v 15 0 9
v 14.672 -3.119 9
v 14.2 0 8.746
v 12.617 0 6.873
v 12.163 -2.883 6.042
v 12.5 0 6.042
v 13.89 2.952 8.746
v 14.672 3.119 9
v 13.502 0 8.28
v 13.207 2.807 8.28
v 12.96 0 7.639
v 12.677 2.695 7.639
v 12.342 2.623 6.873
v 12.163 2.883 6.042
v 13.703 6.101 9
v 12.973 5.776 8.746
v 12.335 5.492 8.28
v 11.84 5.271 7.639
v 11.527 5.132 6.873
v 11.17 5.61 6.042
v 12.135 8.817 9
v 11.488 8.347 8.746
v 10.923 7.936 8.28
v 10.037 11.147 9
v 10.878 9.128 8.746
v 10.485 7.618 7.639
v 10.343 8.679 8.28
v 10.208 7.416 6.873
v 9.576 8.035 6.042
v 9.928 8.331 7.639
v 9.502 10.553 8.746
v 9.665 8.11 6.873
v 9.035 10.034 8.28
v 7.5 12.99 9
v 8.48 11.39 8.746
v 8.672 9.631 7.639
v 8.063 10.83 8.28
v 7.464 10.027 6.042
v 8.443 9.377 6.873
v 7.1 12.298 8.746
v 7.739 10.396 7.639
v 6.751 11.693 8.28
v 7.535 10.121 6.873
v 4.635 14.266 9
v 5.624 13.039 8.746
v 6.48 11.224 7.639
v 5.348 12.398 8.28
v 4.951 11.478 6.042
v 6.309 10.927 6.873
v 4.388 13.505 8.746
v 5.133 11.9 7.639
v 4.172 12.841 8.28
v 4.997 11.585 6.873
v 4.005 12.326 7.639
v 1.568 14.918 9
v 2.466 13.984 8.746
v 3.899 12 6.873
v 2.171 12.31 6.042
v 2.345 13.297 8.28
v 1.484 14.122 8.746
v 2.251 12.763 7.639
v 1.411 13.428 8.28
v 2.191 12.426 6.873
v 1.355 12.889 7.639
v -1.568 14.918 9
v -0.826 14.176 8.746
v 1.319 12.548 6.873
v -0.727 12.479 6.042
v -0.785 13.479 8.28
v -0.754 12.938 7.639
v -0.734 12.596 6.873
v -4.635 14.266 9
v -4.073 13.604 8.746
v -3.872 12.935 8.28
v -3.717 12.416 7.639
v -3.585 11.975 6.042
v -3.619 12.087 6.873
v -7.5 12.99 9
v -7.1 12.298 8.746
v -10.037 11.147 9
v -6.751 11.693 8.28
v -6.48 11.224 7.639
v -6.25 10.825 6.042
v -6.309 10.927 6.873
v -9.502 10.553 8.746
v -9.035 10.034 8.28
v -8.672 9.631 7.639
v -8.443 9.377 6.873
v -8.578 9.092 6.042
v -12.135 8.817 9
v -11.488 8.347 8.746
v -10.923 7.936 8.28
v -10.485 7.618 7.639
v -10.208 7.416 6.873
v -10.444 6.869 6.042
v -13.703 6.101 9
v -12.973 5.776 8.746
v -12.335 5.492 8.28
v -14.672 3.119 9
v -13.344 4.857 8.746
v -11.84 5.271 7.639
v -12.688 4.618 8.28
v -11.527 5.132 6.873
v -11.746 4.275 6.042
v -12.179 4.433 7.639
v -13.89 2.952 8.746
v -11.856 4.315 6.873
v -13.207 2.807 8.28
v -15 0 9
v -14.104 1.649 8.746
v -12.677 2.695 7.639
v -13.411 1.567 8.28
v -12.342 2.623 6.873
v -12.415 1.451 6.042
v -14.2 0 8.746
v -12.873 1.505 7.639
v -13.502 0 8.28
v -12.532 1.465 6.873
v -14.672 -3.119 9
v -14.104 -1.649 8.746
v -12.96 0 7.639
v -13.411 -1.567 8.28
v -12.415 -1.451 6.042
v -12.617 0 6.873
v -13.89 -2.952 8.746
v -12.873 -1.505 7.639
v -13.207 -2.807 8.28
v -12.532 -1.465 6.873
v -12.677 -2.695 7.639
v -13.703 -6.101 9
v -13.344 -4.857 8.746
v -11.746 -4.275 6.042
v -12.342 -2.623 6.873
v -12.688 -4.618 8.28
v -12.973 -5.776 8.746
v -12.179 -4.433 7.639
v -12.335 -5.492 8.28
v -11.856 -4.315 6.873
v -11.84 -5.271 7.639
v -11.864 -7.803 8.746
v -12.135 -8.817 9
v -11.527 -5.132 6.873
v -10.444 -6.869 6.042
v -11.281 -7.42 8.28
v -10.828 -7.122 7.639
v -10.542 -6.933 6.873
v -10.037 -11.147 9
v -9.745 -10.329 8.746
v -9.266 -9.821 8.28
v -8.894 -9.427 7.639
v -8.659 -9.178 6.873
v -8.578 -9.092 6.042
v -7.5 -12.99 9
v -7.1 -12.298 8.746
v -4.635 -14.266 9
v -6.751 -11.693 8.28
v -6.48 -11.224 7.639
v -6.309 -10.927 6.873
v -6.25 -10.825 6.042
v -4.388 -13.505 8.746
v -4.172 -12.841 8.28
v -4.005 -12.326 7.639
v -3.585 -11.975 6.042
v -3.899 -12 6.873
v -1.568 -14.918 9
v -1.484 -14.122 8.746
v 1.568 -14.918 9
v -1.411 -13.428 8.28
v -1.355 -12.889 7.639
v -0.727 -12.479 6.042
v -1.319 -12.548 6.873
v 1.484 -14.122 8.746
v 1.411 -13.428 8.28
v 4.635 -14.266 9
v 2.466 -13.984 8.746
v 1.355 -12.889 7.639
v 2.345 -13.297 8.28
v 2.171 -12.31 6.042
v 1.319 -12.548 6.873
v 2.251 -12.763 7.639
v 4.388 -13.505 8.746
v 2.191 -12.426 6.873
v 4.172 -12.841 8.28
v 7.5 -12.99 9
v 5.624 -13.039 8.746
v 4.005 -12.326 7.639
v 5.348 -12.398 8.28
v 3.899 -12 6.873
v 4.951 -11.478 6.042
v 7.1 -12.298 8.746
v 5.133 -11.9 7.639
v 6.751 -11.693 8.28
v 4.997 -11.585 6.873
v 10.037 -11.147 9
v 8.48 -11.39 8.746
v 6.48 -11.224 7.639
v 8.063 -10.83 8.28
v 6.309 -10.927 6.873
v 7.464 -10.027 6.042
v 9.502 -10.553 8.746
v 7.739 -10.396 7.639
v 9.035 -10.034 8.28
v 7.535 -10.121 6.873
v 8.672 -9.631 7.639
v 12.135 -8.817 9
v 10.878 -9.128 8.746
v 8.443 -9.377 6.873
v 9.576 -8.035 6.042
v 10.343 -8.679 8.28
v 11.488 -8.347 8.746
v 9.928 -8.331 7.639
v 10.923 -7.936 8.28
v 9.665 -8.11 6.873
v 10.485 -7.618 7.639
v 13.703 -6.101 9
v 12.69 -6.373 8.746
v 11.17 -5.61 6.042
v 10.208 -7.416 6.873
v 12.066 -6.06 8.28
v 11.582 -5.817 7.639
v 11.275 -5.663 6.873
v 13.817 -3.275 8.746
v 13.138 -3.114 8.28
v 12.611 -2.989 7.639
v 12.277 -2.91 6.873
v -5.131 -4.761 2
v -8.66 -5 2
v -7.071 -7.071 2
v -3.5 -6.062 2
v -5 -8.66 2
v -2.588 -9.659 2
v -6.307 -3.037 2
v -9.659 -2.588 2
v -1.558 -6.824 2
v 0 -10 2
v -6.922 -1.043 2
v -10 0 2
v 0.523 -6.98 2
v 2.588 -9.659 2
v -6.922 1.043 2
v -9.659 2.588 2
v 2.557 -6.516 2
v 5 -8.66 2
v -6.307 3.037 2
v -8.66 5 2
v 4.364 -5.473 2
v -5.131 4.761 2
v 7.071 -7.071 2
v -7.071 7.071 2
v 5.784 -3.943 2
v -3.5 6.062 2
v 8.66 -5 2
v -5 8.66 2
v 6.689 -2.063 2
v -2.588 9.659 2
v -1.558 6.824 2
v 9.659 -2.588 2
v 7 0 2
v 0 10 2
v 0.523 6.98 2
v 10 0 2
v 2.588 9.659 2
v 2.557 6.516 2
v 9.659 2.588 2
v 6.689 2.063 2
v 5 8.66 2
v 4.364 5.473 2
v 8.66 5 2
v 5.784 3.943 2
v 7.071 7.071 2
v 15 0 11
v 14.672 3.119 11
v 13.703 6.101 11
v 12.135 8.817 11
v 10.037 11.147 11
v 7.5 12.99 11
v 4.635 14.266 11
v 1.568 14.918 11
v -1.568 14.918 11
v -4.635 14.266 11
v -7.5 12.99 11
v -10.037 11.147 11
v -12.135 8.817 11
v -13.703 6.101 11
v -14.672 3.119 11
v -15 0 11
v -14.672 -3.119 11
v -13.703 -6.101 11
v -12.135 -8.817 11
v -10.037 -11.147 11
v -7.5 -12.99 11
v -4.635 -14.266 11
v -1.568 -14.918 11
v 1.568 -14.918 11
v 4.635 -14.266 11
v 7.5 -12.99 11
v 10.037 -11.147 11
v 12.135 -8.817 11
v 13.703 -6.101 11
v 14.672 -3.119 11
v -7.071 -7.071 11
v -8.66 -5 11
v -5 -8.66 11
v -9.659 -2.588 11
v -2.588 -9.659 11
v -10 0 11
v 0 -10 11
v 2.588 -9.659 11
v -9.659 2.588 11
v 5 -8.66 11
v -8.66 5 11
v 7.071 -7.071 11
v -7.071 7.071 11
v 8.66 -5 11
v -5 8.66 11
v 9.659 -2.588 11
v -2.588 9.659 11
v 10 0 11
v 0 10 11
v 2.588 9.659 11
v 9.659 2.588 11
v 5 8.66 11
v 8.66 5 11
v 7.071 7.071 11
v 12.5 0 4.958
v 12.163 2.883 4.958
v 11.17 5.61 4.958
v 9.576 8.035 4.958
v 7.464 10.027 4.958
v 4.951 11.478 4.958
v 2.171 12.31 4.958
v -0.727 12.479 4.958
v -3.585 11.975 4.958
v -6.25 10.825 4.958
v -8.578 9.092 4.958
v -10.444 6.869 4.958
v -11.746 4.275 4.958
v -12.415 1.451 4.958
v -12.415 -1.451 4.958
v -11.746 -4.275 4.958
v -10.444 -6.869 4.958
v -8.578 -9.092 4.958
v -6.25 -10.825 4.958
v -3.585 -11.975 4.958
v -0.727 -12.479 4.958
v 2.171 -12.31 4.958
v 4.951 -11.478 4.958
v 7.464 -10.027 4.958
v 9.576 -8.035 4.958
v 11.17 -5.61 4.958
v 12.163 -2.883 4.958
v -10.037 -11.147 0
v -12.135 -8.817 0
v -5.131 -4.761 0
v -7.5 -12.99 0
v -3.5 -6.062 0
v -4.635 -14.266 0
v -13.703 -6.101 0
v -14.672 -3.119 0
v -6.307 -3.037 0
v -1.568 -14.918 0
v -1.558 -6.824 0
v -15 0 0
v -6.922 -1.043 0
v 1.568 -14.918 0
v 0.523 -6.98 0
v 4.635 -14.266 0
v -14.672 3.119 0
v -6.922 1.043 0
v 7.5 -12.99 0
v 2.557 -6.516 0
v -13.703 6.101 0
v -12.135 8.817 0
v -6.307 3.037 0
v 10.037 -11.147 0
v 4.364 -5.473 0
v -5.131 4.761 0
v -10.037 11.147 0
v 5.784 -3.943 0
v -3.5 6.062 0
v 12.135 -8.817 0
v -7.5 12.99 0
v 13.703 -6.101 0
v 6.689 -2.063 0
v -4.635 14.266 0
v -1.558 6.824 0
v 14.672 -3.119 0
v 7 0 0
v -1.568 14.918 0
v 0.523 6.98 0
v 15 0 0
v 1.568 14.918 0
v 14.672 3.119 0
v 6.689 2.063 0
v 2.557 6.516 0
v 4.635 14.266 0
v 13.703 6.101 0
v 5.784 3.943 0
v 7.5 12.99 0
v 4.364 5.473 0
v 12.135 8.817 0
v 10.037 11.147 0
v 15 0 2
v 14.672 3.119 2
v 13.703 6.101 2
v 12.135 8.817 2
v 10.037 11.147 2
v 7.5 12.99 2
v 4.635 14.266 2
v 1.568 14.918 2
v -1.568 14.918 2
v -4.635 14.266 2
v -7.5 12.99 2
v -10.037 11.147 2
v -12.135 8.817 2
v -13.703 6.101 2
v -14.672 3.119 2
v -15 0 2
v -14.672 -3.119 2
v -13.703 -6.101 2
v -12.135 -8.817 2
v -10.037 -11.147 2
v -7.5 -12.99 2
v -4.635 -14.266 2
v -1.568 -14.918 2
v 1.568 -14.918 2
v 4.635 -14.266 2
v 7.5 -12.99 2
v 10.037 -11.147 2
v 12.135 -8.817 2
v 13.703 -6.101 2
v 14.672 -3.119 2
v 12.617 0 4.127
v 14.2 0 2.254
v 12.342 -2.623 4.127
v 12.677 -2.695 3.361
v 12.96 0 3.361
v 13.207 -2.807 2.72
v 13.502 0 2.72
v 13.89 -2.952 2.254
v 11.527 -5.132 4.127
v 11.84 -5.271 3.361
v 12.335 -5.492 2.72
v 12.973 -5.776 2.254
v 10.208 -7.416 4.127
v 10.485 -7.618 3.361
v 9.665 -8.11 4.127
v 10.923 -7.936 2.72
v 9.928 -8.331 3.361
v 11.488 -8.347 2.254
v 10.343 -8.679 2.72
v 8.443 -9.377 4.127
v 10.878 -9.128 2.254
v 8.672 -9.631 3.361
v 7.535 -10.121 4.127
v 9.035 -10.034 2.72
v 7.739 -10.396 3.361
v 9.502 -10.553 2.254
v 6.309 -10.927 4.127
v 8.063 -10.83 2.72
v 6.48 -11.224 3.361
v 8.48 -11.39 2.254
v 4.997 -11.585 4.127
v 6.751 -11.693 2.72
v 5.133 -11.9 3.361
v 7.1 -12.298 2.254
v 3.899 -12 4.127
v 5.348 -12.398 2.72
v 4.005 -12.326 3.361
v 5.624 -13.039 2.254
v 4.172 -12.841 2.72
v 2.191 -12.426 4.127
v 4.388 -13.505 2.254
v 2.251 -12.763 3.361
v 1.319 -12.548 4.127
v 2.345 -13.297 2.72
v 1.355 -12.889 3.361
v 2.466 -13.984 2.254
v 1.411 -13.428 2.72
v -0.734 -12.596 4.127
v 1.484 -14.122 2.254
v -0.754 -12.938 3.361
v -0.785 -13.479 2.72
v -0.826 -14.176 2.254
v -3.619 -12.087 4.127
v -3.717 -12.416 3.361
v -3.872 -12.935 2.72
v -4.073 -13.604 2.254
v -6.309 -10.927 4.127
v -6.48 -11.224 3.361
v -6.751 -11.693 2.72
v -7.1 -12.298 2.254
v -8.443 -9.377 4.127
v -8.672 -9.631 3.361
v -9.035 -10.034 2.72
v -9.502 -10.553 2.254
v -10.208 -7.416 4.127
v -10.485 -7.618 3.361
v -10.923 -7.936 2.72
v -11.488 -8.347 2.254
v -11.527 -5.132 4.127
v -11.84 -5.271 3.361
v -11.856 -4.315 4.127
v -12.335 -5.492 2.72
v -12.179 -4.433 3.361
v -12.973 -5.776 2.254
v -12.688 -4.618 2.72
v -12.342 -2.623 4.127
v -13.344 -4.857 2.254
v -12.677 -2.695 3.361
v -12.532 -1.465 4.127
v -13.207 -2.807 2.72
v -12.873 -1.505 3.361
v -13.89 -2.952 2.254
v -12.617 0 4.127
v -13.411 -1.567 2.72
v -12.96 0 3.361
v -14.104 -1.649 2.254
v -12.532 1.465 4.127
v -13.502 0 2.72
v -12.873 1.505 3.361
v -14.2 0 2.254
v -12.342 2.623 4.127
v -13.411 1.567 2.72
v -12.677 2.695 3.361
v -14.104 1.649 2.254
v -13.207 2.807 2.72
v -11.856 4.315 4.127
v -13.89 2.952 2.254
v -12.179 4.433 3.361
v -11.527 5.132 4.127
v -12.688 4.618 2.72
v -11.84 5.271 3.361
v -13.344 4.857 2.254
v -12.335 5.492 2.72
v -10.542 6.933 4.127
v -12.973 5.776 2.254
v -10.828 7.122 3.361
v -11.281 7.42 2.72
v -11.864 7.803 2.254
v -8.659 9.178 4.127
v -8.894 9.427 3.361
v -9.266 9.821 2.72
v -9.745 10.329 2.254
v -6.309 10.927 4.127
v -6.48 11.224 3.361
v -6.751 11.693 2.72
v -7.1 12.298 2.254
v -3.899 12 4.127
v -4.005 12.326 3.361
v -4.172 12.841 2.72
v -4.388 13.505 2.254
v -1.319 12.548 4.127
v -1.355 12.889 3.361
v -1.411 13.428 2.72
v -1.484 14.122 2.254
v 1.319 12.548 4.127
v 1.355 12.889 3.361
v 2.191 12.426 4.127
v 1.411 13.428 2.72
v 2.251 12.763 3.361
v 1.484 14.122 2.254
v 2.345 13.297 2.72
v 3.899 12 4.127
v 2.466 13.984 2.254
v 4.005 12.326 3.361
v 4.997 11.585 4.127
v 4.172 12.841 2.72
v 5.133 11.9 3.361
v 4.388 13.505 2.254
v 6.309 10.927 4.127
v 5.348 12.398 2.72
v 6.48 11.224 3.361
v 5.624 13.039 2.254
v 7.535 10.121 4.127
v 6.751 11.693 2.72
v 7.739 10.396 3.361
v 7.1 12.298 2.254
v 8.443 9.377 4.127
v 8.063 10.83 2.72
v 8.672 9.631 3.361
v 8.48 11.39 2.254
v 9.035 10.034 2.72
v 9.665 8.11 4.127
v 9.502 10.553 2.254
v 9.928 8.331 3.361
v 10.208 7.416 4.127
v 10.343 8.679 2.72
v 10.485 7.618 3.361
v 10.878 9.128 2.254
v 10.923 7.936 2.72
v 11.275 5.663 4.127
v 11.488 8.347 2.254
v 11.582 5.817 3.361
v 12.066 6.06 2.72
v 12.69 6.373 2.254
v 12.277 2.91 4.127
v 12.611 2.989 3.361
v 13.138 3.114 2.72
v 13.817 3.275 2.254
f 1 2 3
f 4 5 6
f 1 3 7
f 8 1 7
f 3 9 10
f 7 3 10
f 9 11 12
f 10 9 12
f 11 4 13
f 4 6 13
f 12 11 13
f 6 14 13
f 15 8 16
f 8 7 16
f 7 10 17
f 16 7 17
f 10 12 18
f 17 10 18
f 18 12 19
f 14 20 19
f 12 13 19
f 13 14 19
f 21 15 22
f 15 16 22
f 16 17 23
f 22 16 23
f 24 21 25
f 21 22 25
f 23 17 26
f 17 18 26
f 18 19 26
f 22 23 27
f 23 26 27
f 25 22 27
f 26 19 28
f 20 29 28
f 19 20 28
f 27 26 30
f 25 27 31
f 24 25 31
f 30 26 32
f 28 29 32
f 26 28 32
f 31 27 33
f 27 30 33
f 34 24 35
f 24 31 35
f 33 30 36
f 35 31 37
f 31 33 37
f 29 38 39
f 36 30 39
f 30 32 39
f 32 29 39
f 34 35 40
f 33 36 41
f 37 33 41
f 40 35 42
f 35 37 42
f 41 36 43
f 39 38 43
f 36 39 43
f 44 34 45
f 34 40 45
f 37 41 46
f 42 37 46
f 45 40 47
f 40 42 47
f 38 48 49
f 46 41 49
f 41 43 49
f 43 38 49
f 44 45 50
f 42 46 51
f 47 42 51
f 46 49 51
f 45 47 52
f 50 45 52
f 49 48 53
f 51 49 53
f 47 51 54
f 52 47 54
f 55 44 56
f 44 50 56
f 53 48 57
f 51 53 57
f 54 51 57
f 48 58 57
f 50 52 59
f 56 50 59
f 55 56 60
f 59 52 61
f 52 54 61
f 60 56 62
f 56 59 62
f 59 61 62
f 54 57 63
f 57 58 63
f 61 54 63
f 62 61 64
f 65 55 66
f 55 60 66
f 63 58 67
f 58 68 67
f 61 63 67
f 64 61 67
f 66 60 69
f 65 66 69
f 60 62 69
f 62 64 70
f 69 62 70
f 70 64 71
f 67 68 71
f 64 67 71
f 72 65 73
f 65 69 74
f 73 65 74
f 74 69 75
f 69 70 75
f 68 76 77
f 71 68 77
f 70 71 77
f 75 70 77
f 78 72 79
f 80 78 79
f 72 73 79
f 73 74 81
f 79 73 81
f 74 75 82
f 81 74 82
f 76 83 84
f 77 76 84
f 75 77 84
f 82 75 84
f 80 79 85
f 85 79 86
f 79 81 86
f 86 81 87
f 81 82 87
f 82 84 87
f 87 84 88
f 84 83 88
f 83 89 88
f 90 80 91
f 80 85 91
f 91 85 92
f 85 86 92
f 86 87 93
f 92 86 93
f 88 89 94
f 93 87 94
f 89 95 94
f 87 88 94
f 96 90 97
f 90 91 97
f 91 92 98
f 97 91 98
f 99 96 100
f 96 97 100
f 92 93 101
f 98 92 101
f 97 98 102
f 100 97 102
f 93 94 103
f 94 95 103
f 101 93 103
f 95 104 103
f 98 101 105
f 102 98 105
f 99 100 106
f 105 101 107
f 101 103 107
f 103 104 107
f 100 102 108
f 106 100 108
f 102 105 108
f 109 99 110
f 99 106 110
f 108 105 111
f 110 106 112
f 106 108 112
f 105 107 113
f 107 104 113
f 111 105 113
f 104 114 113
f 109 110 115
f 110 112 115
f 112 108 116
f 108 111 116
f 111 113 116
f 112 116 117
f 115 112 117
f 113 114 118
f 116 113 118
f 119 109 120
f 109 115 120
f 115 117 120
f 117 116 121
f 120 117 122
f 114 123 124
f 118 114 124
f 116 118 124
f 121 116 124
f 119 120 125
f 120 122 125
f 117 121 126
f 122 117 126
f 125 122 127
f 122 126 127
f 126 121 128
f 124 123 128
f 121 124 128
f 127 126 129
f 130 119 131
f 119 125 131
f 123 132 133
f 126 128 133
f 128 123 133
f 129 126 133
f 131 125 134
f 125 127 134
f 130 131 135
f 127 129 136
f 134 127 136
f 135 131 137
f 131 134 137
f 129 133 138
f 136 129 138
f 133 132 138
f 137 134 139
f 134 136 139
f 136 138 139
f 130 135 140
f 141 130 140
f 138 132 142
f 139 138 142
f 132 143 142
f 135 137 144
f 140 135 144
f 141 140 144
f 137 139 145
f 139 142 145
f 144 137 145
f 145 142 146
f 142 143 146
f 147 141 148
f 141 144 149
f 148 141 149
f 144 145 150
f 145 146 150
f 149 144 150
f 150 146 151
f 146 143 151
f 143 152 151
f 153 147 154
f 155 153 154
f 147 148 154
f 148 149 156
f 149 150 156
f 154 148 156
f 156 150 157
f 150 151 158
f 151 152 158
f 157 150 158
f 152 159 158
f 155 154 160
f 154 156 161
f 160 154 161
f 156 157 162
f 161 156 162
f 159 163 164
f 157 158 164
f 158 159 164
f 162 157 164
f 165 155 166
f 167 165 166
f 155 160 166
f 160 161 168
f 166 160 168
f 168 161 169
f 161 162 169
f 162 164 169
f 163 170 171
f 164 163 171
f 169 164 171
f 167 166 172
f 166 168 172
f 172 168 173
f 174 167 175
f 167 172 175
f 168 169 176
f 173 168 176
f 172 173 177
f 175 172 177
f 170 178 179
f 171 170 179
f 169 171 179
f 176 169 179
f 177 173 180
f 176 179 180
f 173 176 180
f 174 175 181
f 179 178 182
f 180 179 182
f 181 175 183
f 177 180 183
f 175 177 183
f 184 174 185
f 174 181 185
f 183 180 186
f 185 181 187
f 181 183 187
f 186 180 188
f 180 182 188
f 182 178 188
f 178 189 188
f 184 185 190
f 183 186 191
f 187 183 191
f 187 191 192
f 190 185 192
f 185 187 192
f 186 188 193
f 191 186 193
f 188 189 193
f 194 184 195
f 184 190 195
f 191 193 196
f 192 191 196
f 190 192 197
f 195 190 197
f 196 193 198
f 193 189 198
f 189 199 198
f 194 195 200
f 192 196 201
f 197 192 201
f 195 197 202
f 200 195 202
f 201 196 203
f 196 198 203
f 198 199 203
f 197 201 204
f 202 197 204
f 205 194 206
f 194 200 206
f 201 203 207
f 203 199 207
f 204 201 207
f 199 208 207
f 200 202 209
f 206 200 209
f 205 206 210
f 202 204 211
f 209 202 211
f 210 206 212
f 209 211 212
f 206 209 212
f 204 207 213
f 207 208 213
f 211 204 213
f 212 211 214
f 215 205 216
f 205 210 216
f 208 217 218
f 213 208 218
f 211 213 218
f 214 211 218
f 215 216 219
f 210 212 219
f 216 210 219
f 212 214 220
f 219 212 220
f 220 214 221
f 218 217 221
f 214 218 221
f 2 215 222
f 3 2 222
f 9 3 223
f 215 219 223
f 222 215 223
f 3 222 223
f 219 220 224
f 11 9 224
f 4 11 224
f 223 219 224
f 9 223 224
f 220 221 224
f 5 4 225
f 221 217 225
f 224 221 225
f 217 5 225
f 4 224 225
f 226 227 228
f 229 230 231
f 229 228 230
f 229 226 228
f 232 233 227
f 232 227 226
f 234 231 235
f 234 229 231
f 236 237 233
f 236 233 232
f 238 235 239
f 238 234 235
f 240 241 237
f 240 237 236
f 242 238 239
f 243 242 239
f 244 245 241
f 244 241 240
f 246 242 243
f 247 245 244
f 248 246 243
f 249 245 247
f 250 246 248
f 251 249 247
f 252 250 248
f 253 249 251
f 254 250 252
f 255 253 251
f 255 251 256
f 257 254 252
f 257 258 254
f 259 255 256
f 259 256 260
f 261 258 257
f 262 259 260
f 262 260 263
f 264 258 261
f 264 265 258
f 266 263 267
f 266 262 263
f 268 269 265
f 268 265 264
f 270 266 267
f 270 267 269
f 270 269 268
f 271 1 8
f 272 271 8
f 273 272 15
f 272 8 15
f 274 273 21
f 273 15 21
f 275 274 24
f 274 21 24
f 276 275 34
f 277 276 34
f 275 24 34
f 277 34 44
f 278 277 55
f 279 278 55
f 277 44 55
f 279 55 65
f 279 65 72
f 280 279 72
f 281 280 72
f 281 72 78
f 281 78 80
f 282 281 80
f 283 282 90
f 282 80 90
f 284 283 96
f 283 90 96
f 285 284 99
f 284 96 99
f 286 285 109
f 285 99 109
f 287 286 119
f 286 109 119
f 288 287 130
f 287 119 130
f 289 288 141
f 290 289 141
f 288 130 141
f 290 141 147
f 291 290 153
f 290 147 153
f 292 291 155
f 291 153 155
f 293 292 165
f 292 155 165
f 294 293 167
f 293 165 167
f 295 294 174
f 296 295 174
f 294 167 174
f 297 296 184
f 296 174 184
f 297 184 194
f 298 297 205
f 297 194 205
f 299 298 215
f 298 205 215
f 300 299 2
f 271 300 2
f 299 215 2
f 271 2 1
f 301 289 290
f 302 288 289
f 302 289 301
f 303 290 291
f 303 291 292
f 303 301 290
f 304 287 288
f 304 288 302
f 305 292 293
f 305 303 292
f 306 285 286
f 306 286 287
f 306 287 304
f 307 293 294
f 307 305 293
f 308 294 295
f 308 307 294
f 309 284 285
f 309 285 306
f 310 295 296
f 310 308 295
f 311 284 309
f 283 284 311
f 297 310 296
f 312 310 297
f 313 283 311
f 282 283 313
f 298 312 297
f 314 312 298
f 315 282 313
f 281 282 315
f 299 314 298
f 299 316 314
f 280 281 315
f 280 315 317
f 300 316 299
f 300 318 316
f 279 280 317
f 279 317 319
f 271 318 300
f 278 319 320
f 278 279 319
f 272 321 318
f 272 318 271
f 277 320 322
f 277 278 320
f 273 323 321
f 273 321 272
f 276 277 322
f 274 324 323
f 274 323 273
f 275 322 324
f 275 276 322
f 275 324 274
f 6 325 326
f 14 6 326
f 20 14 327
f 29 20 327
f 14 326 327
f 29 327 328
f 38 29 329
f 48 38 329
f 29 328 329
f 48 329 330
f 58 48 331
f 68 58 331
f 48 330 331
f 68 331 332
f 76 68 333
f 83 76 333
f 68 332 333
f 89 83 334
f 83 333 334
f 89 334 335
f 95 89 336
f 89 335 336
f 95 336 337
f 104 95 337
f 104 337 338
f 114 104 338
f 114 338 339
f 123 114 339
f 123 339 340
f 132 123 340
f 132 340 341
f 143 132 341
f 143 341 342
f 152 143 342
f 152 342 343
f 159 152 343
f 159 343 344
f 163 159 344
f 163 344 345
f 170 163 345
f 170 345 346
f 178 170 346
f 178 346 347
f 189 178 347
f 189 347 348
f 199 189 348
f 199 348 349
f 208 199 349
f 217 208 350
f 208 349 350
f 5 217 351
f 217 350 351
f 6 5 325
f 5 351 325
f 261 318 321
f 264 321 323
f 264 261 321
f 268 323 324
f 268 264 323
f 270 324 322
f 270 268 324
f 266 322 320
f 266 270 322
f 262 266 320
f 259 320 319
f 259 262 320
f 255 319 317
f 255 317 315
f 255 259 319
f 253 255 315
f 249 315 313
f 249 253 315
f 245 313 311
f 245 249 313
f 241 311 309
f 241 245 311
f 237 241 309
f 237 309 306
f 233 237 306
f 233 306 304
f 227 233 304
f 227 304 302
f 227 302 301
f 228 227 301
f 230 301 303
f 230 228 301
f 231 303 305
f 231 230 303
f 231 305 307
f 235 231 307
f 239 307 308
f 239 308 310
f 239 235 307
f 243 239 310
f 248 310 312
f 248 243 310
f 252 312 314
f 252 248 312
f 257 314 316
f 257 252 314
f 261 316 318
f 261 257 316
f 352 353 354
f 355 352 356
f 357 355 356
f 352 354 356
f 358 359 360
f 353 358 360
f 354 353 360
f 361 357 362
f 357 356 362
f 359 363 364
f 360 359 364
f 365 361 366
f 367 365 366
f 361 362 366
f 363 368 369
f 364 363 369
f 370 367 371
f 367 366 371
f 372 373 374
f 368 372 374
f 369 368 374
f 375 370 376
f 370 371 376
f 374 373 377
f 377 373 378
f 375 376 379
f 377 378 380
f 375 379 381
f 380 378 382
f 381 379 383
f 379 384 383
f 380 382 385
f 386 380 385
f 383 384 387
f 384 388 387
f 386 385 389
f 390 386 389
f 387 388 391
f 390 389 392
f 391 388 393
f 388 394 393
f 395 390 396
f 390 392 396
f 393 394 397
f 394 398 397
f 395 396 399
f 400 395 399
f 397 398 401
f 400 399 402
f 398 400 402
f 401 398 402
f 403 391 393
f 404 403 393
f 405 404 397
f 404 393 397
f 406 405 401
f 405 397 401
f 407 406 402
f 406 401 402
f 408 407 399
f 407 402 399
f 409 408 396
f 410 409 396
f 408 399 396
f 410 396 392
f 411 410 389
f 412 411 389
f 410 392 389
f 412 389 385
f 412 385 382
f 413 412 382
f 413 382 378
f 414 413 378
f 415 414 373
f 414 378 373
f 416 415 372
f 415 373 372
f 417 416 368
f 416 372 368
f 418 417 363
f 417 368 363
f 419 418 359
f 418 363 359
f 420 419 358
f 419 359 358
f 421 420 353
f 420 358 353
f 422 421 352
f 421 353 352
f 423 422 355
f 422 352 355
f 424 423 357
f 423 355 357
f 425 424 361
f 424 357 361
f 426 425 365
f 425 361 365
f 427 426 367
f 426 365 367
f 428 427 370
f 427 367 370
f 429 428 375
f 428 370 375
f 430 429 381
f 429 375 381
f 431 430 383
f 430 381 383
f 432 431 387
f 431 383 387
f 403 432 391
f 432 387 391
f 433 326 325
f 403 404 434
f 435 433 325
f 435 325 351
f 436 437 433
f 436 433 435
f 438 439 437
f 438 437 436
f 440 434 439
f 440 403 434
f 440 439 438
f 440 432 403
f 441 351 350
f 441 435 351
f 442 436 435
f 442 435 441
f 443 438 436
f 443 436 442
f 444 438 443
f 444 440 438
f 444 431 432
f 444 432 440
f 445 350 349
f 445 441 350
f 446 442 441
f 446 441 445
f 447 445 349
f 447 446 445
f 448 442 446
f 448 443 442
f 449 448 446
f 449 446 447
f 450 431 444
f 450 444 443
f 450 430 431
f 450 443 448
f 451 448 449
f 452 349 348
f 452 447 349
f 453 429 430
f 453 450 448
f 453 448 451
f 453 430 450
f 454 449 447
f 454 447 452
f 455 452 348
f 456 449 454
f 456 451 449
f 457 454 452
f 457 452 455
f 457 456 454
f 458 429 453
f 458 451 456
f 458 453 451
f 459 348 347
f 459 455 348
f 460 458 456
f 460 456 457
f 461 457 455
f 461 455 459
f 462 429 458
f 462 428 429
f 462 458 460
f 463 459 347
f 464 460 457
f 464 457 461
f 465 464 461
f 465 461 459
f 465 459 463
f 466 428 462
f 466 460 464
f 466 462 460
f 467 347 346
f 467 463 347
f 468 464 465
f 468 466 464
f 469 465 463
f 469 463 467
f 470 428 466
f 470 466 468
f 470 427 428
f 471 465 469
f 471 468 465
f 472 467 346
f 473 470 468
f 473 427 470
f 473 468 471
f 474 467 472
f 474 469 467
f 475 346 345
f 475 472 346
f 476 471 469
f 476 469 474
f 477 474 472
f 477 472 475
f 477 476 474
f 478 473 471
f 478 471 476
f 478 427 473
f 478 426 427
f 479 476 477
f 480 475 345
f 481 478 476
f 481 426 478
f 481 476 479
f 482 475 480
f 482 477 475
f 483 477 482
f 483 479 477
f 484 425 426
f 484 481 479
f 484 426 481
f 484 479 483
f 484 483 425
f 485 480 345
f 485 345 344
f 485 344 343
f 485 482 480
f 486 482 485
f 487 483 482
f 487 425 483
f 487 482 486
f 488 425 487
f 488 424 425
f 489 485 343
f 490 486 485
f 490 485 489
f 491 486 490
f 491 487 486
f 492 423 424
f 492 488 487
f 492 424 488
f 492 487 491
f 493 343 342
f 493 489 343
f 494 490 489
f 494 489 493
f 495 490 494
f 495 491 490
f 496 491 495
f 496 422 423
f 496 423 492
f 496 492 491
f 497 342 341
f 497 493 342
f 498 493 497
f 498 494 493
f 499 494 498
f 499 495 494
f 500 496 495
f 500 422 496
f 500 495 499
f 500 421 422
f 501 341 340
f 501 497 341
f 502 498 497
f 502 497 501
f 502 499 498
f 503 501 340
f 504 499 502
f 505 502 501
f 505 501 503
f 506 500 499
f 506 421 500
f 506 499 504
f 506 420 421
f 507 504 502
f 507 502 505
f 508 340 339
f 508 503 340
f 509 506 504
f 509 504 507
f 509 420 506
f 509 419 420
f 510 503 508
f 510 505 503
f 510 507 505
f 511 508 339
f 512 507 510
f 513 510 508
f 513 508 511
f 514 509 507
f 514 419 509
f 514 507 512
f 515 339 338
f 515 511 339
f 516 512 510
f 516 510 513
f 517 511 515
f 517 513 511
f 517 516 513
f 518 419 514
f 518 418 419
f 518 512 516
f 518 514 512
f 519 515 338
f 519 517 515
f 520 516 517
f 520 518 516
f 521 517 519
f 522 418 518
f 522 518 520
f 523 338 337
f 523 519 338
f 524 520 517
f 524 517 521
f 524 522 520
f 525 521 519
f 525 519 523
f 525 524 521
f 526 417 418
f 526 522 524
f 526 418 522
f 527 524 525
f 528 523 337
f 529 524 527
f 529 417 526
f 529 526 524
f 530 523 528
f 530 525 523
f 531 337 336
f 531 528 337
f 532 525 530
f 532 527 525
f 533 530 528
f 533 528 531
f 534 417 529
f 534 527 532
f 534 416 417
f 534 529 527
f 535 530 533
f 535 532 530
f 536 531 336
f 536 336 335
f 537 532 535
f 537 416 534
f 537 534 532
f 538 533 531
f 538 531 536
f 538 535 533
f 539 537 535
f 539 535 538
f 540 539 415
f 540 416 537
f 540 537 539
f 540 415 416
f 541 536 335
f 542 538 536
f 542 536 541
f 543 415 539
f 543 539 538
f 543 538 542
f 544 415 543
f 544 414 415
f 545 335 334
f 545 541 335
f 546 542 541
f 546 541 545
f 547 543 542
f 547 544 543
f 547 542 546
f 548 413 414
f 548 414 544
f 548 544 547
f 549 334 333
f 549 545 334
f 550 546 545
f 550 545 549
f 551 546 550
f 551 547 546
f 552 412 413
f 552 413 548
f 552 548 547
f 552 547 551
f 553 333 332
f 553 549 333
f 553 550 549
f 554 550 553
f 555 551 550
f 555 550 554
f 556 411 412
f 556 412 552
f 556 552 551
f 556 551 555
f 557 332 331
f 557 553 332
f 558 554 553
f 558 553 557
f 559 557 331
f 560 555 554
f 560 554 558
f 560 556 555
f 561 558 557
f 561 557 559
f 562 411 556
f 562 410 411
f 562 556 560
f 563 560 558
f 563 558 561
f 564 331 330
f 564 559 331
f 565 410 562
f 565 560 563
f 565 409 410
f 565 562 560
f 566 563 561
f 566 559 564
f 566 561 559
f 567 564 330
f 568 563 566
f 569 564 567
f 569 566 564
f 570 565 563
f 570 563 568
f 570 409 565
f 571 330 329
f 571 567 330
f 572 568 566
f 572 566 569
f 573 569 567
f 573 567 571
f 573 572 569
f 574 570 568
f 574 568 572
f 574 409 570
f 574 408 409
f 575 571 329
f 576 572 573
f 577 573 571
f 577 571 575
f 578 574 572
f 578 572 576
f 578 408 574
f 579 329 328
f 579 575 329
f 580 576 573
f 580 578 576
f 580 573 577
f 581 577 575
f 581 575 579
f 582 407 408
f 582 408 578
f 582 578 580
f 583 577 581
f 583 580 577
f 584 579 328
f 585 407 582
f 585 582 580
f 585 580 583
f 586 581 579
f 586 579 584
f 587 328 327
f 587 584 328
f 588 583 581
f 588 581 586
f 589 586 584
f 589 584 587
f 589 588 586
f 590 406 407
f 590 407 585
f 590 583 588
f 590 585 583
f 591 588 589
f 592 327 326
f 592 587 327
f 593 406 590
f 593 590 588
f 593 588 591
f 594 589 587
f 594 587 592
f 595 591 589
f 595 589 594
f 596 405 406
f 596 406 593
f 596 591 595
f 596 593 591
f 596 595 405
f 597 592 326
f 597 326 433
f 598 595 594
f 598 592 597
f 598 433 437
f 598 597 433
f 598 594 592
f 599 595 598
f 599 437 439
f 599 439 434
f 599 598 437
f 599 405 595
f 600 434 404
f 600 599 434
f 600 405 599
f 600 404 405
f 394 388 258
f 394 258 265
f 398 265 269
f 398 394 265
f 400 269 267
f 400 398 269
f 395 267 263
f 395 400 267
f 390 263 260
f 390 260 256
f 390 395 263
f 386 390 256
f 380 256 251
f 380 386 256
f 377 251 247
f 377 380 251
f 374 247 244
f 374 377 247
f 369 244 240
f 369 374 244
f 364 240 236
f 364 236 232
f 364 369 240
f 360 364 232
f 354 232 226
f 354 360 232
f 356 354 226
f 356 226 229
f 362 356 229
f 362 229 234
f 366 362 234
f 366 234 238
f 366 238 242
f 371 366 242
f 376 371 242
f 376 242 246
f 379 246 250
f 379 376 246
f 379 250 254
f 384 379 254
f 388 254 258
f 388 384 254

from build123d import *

# Parameters (mm, degrees)
F0_R     = 15
F0_R_2   = 12.5
F0_R_3   = 10
F0_R_4   = 7
F1_DEPTH = 2
F2_DEPTH = 9
F3_R     = 15
F3_R_2   = 12.5
F3_R_3   = 10
F4_DEPTH = 2


# Not quite as in the source:
# - a fillet or chamfer that OpenCascade refuses, or shapes differently, is made with other operations: its cross-section is extruded or revolved along the edge and cut away or added


with BuildPart() as f1:
    # F0 (on Top) → F1 (new body)
    with BuildSketch(Plane.XY):
        Circle(F0_R)
        Circle(F0_R_2, mode=Mode.SUBTRACT)
        Circle(F0_R_2)
        Circle(F0_R_3, mode=Mode.SUBTRACT)
        Circle(F0_R_3)
        Circle(F0_R_4, mode=Mode.SUBTRACT)
    extrude(amount=F1_DEPTH)

    # F0 (on Top) → F2 (join)
    with BuildSketch(Plane.XY):
        Circle(F0_R_2)
        Circle(F0_R_3, mode=Mode.SUBTRACT)
    extrude(amount=F2_DEPTH)

    # F3 (on face) → F4 (join)
    with BuildSketch(Plane.XY.offset(9)):
        Circle(F3_R)
        Circle(F3_R_2, mode=Mode.SUBTRACT)
        Circle(F3_R_2)
        Circle(F3_R_3, mode=Mode.SUBTRACT)
    extrude(amount=F4_DEPTH)

    # F5: fillet of radius 3 on 2 edges, made by hand

    # F5_s1 → F5_t2 (revolve)
    with BuildSketch(Plane.XZ):
        with BuildLine():
            ThreePointArc((12.5, 4.9580398916), (13.2087121525, 3.0215482184), (15, 2))
            Line((15, 2), (12.5, 2))
            Line((12.5, 2), (12.5, 4.9580398916))
        make_face()
    revolve(axis=Axis((0, 0, 2), (0, 0, -1)))

    # F5_s3 → F5_t4 (revolve)
    with BuildSketch(Plane.XZ):
        with BuildLine():
            ThreePointArc((15, 9), (13.2087121525, 7.9784517816), (12.5, 6.0419601084))
            Line((12.5, 6.0419601084), (12.5, 9))
            Line((12.5, 9), (15, 9))
        make_face()
    revolve(axis=Axis((0, 0, 9), (0, 0, 1)))


solid = f1.part
